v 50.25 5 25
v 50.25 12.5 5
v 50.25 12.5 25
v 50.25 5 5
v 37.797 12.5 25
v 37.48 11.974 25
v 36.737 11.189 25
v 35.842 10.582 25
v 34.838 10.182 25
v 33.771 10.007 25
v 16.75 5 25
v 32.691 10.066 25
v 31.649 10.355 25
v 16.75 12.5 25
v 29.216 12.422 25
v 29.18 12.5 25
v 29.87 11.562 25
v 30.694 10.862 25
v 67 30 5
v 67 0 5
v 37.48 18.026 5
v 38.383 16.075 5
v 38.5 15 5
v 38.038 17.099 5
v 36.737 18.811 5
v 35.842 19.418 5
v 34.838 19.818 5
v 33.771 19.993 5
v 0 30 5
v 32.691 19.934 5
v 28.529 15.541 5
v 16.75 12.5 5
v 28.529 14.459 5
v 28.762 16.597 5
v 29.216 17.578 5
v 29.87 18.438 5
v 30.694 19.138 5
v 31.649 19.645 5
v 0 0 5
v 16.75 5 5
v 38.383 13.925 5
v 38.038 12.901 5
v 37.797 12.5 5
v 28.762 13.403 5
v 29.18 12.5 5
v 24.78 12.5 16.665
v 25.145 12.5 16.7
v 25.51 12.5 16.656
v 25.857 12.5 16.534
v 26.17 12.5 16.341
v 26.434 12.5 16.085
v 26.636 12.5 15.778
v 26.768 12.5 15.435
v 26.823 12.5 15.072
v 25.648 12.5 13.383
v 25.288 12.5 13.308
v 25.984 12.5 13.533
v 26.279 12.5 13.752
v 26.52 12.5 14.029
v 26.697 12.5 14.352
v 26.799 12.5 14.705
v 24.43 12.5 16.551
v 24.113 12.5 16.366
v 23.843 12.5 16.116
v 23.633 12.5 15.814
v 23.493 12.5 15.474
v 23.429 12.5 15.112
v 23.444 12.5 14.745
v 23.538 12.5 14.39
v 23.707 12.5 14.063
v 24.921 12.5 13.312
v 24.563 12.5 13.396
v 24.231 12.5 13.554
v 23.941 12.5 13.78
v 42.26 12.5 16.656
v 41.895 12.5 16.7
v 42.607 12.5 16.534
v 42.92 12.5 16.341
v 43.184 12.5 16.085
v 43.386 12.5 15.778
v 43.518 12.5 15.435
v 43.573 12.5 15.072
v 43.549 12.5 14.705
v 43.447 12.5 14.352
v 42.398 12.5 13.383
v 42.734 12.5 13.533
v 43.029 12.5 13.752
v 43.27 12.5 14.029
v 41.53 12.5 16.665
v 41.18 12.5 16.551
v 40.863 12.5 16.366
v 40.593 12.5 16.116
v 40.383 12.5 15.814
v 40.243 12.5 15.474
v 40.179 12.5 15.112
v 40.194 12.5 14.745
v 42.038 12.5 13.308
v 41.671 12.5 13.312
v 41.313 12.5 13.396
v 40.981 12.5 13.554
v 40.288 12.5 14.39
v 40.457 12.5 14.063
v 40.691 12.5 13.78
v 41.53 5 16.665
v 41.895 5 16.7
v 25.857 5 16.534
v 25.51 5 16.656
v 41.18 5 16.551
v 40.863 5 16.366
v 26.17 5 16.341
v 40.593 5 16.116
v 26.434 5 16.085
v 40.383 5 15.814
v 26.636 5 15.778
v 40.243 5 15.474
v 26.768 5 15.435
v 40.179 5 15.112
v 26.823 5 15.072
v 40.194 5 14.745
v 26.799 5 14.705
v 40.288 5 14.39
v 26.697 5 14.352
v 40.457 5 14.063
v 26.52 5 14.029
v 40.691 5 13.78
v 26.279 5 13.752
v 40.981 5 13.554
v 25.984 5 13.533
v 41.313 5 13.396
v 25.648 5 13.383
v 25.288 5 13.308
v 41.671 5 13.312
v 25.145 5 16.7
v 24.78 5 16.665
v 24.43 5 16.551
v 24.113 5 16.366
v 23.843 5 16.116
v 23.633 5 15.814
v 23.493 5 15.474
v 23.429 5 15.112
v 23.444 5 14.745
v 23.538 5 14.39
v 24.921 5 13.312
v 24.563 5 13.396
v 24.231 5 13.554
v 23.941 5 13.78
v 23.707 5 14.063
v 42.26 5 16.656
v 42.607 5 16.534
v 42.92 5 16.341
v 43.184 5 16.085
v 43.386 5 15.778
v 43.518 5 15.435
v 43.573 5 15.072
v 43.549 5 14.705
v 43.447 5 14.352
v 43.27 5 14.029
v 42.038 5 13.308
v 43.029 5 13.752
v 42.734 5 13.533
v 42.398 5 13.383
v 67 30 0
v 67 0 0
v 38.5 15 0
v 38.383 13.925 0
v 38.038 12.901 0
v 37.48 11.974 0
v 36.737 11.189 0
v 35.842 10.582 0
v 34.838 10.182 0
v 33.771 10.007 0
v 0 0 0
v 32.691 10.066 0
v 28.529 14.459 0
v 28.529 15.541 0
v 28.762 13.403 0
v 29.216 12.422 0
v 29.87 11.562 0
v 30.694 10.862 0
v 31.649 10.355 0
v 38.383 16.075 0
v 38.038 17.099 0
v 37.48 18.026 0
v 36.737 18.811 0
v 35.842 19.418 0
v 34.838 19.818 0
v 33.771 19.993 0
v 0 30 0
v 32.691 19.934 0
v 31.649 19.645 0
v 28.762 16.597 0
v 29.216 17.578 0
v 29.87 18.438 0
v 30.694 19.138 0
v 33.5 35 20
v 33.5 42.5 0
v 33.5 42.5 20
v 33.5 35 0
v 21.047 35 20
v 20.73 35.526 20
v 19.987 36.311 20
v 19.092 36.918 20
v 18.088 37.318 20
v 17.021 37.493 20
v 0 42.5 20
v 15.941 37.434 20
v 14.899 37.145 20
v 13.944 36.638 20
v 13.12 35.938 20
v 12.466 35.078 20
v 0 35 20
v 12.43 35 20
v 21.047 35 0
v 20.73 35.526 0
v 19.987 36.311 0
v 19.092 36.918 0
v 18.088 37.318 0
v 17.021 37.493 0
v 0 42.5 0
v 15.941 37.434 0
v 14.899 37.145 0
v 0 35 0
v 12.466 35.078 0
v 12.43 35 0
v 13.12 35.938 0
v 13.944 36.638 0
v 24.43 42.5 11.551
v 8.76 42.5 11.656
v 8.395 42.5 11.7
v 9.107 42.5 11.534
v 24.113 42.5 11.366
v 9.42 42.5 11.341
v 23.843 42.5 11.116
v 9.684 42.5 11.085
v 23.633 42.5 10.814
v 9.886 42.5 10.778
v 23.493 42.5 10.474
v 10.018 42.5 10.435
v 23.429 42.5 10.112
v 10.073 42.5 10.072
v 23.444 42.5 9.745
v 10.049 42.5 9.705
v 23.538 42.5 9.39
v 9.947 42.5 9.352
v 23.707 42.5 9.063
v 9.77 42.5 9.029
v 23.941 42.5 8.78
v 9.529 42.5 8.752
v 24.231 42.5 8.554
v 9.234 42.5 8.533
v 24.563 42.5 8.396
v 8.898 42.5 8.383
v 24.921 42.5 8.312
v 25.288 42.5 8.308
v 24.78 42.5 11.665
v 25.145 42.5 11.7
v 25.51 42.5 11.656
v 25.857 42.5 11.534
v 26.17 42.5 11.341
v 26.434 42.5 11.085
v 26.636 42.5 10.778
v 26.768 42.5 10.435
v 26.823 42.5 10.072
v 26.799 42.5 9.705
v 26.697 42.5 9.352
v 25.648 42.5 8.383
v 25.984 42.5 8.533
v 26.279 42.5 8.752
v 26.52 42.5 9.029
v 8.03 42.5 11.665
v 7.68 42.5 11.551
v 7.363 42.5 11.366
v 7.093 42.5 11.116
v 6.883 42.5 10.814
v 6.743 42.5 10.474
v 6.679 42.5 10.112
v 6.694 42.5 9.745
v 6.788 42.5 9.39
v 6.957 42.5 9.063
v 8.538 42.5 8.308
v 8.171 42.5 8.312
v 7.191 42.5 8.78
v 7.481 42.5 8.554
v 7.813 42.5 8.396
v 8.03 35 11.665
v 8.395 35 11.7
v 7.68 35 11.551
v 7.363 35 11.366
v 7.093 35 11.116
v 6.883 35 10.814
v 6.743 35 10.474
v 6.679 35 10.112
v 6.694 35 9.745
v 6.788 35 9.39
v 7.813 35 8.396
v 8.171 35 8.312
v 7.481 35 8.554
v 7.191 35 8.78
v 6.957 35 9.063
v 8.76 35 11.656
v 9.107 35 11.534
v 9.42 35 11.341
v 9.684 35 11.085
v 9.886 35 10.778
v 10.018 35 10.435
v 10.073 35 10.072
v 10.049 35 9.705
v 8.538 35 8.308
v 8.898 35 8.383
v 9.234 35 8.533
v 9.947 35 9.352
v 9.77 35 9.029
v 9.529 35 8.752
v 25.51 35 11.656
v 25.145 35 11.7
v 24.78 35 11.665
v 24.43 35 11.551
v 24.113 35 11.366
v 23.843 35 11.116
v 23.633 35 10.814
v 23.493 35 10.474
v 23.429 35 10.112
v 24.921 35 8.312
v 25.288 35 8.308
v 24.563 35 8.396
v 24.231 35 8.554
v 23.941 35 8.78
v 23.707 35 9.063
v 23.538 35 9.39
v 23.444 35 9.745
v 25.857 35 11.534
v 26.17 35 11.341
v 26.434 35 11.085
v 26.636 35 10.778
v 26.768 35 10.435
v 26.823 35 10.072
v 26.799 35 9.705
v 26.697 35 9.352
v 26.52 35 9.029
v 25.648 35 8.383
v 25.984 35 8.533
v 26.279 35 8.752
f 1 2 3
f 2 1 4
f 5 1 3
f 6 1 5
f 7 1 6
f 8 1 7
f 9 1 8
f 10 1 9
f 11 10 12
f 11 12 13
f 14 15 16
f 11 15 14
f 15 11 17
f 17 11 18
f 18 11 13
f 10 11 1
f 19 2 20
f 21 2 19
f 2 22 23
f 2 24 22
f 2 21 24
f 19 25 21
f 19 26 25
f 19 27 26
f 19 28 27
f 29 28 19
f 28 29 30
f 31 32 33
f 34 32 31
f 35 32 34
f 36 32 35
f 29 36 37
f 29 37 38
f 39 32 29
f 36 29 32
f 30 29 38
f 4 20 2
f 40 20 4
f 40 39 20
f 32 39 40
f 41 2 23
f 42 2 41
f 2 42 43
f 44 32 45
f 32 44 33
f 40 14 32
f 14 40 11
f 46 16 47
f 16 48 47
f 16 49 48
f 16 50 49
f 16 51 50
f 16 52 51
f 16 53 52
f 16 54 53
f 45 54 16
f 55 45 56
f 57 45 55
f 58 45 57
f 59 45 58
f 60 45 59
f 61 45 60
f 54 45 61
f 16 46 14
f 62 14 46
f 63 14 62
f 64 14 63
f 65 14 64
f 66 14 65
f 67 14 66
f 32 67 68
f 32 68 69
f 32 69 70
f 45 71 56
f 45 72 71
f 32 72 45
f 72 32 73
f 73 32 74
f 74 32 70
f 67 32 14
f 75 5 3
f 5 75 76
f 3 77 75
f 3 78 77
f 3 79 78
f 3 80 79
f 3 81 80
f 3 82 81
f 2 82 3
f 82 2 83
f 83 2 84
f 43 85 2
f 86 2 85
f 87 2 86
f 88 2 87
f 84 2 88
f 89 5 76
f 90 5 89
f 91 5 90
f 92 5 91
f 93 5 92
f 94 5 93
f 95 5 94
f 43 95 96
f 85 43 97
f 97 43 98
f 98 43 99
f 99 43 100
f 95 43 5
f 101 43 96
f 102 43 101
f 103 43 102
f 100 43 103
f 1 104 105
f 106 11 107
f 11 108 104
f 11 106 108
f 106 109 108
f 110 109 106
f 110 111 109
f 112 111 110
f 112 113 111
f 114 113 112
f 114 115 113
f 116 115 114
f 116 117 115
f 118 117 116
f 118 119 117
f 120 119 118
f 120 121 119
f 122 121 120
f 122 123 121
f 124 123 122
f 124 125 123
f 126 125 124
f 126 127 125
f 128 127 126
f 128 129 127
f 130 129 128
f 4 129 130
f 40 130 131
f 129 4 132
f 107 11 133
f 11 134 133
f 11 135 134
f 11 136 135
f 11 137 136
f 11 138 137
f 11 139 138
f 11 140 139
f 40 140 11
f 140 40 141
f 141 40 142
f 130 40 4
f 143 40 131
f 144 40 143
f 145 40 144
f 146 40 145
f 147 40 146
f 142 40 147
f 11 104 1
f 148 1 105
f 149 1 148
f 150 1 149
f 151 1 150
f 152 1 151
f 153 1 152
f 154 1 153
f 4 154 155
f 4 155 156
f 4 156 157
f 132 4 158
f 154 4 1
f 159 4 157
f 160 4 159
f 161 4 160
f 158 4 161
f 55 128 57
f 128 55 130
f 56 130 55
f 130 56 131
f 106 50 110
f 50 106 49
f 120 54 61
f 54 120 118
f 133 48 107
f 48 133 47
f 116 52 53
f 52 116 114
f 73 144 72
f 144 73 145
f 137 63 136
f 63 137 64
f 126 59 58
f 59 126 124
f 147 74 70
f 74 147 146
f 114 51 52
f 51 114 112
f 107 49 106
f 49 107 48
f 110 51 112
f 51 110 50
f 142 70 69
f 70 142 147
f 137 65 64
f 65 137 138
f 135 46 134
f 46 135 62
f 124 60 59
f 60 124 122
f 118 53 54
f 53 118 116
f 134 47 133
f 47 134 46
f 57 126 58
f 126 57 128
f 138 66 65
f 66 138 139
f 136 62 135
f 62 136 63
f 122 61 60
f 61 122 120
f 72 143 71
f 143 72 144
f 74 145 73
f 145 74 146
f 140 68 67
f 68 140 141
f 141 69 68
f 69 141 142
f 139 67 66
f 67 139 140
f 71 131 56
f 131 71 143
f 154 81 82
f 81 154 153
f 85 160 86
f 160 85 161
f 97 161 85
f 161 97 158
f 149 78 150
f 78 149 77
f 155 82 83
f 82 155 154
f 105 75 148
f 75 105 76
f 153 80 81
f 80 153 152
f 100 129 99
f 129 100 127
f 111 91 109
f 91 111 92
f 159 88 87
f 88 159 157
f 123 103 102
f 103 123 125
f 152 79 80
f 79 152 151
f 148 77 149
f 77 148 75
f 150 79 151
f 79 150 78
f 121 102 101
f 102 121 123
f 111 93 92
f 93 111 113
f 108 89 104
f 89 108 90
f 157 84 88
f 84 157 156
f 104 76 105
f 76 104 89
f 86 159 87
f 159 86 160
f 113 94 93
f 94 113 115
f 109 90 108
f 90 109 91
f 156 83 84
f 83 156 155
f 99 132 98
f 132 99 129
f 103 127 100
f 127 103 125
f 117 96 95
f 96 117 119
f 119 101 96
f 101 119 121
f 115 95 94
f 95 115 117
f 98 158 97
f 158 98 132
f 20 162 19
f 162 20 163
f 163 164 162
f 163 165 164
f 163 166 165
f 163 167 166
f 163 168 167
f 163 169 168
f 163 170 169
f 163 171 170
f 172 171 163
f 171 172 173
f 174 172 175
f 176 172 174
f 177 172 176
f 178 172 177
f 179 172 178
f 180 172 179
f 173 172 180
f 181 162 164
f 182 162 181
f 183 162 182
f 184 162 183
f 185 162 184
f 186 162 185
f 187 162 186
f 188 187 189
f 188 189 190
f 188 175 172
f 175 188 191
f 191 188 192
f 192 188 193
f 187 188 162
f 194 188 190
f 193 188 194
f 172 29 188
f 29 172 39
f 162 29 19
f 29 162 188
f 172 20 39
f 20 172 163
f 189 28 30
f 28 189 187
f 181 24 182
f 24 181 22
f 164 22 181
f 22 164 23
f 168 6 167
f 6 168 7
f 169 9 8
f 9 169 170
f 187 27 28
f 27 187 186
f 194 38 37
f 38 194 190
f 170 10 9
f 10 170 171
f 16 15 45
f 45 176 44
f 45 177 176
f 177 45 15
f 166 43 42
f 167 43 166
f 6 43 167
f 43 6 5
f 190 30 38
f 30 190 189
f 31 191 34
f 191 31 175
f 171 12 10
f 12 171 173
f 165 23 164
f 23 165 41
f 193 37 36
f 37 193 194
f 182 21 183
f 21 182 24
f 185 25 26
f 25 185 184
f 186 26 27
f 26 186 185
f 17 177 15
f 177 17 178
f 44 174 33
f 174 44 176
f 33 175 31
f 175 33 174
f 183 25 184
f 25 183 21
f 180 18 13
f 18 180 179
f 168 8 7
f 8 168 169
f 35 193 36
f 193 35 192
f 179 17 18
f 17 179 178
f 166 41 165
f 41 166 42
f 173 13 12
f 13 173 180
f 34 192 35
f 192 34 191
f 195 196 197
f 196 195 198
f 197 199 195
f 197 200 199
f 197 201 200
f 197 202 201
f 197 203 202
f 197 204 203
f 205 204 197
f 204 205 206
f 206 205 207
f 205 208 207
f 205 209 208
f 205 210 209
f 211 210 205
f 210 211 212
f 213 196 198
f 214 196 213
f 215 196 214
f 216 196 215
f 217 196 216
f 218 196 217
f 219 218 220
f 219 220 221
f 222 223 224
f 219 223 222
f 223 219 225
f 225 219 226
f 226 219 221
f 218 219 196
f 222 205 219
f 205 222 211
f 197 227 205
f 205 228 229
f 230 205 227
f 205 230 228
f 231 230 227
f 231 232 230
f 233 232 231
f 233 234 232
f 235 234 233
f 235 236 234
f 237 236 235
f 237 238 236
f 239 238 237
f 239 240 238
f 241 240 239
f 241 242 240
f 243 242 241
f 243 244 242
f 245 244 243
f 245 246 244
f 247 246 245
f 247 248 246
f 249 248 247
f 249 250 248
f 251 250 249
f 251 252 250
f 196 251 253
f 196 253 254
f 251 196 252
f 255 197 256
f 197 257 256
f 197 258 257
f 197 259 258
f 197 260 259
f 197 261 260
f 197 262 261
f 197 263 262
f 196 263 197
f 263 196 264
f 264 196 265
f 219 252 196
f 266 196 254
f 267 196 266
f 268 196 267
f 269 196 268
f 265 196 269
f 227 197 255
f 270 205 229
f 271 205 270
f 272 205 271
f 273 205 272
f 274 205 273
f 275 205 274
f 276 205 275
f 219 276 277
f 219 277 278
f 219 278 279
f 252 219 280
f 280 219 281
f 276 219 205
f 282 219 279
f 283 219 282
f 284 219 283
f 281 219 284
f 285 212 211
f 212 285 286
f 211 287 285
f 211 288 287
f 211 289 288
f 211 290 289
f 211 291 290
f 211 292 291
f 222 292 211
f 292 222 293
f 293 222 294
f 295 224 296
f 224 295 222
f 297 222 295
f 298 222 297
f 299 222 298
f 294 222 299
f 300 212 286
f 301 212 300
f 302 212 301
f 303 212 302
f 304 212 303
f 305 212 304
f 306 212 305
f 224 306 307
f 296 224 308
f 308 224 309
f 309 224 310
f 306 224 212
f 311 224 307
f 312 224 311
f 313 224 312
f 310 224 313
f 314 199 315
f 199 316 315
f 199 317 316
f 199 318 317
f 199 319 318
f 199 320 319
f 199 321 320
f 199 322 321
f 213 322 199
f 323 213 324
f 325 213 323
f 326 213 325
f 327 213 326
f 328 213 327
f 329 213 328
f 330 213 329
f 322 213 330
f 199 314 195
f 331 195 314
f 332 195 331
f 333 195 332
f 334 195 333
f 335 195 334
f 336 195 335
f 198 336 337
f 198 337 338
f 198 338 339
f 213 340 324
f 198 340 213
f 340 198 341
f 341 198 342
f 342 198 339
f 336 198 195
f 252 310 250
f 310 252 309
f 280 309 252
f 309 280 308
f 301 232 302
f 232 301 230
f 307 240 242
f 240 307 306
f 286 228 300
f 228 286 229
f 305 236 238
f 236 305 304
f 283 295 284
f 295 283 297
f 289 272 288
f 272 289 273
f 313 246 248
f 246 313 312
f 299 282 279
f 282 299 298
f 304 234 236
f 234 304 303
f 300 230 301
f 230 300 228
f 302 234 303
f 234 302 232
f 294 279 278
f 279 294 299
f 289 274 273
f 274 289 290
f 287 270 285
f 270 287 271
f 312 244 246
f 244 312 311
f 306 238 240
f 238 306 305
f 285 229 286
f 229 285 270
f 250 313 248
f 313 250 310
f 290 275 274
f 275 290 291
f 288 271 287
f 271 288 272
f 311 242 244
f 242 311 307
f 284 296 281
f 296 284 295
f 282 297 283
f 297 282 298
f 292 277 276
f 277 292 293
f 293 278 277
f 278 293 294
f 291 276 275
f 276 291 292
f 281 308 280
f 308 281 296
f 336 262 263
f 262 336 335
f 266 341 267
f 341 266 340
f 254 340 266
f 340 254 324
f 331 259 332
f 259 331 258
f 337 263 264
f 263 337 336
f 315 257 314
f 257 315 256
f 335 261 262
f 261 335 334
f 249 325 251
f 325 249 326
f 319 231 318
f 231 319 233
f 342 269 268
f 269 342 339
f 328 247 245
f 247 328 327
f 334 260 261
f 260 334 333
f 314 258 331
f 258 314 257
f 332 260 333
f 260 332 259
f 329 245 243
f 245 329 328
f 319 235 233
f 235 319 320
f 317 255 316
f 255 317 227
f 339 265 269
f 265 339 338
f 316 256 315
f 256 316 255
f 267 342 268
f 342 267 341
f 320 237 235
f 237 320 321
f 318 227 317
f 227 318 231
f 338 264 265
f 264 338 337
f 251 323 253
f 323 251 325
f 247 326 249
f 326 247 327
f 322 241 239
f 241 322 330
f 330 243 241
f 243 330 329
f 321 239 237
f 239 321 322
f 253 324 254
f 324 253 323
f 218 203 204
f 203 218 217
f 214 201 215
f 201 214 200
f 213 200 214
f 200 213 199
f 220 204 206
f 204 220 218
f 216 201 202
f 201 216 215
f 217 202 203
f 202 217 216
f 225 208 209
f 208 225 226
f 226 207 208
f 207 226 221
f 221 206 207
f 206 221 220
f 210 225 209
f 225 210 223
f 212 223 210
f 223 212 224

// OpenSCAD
/******************************************************/
/* peristaltic extruder for 3d printing     		  */
/* file: soporte_boquilla.scad			 		      */
/* author: luis rodriguez				 	          */
/* version: 0.28						 	          */
/* w3b: tiny.cc/lyu     					 		  */
/* info:				    				 		  */
/******************************************************/
// @todo: - 


ancho = 67;
largo = 30;
altura = 5;

boquilla = 10;

altura_cierre = 20;

diametro_tornillo = 3.4;

difference(){
	union(){
		cube( size = [ ancho , largo , altura ] );	
		// Soporte para el cierre
		translate([ancho / 2 - (ancho / 4), boquilla / 2, altura]) {
			modulo_cierre();
		}
	}
	// Taladro boquilla
	translate( [ ancho / 2, largo / 2, 0]) {
		color("Peru"){
			cylinder(r = boquilla / 2, largo , $fn = 29);
		}
	}
}

translate([0, largo + altura, 0]) {
	difference(){
		modulo_cierre();
		translate( [ ancho / 4 , - boquilla / 4 , 0 ]) {
			cylinder(r = boquilla / 2, largo , $fn = 29);	
		}
	}
	
}


/* MODULOOOOOOOOOOS */
module modulo_cierre() 
difference(){
	color("Blue") {
		cube(size=[ancho / 2, largo / 4, altura_cierre ] );	
	}		
		// Taladros tornillos
		translate( [ ancho / 8 , largo / 2 , altura_cierre / 2 ]) {
			rotate([90, 10, 0]) {
				color("Red"){
					cylinder(r = diametro_tornillo / 2 , largo, $fn = 29);
				}		
			}
		}
		translate( [ 3*ancho / 8 , largo / 2 , altura_cierre / 2 ]) {
			rotate([90, 10, 0]) {
				color("Red"){
					cylinder(r = diametro_tornillo / 2 , largo, $fn = 29);
				}		
			}		
		}
	}
